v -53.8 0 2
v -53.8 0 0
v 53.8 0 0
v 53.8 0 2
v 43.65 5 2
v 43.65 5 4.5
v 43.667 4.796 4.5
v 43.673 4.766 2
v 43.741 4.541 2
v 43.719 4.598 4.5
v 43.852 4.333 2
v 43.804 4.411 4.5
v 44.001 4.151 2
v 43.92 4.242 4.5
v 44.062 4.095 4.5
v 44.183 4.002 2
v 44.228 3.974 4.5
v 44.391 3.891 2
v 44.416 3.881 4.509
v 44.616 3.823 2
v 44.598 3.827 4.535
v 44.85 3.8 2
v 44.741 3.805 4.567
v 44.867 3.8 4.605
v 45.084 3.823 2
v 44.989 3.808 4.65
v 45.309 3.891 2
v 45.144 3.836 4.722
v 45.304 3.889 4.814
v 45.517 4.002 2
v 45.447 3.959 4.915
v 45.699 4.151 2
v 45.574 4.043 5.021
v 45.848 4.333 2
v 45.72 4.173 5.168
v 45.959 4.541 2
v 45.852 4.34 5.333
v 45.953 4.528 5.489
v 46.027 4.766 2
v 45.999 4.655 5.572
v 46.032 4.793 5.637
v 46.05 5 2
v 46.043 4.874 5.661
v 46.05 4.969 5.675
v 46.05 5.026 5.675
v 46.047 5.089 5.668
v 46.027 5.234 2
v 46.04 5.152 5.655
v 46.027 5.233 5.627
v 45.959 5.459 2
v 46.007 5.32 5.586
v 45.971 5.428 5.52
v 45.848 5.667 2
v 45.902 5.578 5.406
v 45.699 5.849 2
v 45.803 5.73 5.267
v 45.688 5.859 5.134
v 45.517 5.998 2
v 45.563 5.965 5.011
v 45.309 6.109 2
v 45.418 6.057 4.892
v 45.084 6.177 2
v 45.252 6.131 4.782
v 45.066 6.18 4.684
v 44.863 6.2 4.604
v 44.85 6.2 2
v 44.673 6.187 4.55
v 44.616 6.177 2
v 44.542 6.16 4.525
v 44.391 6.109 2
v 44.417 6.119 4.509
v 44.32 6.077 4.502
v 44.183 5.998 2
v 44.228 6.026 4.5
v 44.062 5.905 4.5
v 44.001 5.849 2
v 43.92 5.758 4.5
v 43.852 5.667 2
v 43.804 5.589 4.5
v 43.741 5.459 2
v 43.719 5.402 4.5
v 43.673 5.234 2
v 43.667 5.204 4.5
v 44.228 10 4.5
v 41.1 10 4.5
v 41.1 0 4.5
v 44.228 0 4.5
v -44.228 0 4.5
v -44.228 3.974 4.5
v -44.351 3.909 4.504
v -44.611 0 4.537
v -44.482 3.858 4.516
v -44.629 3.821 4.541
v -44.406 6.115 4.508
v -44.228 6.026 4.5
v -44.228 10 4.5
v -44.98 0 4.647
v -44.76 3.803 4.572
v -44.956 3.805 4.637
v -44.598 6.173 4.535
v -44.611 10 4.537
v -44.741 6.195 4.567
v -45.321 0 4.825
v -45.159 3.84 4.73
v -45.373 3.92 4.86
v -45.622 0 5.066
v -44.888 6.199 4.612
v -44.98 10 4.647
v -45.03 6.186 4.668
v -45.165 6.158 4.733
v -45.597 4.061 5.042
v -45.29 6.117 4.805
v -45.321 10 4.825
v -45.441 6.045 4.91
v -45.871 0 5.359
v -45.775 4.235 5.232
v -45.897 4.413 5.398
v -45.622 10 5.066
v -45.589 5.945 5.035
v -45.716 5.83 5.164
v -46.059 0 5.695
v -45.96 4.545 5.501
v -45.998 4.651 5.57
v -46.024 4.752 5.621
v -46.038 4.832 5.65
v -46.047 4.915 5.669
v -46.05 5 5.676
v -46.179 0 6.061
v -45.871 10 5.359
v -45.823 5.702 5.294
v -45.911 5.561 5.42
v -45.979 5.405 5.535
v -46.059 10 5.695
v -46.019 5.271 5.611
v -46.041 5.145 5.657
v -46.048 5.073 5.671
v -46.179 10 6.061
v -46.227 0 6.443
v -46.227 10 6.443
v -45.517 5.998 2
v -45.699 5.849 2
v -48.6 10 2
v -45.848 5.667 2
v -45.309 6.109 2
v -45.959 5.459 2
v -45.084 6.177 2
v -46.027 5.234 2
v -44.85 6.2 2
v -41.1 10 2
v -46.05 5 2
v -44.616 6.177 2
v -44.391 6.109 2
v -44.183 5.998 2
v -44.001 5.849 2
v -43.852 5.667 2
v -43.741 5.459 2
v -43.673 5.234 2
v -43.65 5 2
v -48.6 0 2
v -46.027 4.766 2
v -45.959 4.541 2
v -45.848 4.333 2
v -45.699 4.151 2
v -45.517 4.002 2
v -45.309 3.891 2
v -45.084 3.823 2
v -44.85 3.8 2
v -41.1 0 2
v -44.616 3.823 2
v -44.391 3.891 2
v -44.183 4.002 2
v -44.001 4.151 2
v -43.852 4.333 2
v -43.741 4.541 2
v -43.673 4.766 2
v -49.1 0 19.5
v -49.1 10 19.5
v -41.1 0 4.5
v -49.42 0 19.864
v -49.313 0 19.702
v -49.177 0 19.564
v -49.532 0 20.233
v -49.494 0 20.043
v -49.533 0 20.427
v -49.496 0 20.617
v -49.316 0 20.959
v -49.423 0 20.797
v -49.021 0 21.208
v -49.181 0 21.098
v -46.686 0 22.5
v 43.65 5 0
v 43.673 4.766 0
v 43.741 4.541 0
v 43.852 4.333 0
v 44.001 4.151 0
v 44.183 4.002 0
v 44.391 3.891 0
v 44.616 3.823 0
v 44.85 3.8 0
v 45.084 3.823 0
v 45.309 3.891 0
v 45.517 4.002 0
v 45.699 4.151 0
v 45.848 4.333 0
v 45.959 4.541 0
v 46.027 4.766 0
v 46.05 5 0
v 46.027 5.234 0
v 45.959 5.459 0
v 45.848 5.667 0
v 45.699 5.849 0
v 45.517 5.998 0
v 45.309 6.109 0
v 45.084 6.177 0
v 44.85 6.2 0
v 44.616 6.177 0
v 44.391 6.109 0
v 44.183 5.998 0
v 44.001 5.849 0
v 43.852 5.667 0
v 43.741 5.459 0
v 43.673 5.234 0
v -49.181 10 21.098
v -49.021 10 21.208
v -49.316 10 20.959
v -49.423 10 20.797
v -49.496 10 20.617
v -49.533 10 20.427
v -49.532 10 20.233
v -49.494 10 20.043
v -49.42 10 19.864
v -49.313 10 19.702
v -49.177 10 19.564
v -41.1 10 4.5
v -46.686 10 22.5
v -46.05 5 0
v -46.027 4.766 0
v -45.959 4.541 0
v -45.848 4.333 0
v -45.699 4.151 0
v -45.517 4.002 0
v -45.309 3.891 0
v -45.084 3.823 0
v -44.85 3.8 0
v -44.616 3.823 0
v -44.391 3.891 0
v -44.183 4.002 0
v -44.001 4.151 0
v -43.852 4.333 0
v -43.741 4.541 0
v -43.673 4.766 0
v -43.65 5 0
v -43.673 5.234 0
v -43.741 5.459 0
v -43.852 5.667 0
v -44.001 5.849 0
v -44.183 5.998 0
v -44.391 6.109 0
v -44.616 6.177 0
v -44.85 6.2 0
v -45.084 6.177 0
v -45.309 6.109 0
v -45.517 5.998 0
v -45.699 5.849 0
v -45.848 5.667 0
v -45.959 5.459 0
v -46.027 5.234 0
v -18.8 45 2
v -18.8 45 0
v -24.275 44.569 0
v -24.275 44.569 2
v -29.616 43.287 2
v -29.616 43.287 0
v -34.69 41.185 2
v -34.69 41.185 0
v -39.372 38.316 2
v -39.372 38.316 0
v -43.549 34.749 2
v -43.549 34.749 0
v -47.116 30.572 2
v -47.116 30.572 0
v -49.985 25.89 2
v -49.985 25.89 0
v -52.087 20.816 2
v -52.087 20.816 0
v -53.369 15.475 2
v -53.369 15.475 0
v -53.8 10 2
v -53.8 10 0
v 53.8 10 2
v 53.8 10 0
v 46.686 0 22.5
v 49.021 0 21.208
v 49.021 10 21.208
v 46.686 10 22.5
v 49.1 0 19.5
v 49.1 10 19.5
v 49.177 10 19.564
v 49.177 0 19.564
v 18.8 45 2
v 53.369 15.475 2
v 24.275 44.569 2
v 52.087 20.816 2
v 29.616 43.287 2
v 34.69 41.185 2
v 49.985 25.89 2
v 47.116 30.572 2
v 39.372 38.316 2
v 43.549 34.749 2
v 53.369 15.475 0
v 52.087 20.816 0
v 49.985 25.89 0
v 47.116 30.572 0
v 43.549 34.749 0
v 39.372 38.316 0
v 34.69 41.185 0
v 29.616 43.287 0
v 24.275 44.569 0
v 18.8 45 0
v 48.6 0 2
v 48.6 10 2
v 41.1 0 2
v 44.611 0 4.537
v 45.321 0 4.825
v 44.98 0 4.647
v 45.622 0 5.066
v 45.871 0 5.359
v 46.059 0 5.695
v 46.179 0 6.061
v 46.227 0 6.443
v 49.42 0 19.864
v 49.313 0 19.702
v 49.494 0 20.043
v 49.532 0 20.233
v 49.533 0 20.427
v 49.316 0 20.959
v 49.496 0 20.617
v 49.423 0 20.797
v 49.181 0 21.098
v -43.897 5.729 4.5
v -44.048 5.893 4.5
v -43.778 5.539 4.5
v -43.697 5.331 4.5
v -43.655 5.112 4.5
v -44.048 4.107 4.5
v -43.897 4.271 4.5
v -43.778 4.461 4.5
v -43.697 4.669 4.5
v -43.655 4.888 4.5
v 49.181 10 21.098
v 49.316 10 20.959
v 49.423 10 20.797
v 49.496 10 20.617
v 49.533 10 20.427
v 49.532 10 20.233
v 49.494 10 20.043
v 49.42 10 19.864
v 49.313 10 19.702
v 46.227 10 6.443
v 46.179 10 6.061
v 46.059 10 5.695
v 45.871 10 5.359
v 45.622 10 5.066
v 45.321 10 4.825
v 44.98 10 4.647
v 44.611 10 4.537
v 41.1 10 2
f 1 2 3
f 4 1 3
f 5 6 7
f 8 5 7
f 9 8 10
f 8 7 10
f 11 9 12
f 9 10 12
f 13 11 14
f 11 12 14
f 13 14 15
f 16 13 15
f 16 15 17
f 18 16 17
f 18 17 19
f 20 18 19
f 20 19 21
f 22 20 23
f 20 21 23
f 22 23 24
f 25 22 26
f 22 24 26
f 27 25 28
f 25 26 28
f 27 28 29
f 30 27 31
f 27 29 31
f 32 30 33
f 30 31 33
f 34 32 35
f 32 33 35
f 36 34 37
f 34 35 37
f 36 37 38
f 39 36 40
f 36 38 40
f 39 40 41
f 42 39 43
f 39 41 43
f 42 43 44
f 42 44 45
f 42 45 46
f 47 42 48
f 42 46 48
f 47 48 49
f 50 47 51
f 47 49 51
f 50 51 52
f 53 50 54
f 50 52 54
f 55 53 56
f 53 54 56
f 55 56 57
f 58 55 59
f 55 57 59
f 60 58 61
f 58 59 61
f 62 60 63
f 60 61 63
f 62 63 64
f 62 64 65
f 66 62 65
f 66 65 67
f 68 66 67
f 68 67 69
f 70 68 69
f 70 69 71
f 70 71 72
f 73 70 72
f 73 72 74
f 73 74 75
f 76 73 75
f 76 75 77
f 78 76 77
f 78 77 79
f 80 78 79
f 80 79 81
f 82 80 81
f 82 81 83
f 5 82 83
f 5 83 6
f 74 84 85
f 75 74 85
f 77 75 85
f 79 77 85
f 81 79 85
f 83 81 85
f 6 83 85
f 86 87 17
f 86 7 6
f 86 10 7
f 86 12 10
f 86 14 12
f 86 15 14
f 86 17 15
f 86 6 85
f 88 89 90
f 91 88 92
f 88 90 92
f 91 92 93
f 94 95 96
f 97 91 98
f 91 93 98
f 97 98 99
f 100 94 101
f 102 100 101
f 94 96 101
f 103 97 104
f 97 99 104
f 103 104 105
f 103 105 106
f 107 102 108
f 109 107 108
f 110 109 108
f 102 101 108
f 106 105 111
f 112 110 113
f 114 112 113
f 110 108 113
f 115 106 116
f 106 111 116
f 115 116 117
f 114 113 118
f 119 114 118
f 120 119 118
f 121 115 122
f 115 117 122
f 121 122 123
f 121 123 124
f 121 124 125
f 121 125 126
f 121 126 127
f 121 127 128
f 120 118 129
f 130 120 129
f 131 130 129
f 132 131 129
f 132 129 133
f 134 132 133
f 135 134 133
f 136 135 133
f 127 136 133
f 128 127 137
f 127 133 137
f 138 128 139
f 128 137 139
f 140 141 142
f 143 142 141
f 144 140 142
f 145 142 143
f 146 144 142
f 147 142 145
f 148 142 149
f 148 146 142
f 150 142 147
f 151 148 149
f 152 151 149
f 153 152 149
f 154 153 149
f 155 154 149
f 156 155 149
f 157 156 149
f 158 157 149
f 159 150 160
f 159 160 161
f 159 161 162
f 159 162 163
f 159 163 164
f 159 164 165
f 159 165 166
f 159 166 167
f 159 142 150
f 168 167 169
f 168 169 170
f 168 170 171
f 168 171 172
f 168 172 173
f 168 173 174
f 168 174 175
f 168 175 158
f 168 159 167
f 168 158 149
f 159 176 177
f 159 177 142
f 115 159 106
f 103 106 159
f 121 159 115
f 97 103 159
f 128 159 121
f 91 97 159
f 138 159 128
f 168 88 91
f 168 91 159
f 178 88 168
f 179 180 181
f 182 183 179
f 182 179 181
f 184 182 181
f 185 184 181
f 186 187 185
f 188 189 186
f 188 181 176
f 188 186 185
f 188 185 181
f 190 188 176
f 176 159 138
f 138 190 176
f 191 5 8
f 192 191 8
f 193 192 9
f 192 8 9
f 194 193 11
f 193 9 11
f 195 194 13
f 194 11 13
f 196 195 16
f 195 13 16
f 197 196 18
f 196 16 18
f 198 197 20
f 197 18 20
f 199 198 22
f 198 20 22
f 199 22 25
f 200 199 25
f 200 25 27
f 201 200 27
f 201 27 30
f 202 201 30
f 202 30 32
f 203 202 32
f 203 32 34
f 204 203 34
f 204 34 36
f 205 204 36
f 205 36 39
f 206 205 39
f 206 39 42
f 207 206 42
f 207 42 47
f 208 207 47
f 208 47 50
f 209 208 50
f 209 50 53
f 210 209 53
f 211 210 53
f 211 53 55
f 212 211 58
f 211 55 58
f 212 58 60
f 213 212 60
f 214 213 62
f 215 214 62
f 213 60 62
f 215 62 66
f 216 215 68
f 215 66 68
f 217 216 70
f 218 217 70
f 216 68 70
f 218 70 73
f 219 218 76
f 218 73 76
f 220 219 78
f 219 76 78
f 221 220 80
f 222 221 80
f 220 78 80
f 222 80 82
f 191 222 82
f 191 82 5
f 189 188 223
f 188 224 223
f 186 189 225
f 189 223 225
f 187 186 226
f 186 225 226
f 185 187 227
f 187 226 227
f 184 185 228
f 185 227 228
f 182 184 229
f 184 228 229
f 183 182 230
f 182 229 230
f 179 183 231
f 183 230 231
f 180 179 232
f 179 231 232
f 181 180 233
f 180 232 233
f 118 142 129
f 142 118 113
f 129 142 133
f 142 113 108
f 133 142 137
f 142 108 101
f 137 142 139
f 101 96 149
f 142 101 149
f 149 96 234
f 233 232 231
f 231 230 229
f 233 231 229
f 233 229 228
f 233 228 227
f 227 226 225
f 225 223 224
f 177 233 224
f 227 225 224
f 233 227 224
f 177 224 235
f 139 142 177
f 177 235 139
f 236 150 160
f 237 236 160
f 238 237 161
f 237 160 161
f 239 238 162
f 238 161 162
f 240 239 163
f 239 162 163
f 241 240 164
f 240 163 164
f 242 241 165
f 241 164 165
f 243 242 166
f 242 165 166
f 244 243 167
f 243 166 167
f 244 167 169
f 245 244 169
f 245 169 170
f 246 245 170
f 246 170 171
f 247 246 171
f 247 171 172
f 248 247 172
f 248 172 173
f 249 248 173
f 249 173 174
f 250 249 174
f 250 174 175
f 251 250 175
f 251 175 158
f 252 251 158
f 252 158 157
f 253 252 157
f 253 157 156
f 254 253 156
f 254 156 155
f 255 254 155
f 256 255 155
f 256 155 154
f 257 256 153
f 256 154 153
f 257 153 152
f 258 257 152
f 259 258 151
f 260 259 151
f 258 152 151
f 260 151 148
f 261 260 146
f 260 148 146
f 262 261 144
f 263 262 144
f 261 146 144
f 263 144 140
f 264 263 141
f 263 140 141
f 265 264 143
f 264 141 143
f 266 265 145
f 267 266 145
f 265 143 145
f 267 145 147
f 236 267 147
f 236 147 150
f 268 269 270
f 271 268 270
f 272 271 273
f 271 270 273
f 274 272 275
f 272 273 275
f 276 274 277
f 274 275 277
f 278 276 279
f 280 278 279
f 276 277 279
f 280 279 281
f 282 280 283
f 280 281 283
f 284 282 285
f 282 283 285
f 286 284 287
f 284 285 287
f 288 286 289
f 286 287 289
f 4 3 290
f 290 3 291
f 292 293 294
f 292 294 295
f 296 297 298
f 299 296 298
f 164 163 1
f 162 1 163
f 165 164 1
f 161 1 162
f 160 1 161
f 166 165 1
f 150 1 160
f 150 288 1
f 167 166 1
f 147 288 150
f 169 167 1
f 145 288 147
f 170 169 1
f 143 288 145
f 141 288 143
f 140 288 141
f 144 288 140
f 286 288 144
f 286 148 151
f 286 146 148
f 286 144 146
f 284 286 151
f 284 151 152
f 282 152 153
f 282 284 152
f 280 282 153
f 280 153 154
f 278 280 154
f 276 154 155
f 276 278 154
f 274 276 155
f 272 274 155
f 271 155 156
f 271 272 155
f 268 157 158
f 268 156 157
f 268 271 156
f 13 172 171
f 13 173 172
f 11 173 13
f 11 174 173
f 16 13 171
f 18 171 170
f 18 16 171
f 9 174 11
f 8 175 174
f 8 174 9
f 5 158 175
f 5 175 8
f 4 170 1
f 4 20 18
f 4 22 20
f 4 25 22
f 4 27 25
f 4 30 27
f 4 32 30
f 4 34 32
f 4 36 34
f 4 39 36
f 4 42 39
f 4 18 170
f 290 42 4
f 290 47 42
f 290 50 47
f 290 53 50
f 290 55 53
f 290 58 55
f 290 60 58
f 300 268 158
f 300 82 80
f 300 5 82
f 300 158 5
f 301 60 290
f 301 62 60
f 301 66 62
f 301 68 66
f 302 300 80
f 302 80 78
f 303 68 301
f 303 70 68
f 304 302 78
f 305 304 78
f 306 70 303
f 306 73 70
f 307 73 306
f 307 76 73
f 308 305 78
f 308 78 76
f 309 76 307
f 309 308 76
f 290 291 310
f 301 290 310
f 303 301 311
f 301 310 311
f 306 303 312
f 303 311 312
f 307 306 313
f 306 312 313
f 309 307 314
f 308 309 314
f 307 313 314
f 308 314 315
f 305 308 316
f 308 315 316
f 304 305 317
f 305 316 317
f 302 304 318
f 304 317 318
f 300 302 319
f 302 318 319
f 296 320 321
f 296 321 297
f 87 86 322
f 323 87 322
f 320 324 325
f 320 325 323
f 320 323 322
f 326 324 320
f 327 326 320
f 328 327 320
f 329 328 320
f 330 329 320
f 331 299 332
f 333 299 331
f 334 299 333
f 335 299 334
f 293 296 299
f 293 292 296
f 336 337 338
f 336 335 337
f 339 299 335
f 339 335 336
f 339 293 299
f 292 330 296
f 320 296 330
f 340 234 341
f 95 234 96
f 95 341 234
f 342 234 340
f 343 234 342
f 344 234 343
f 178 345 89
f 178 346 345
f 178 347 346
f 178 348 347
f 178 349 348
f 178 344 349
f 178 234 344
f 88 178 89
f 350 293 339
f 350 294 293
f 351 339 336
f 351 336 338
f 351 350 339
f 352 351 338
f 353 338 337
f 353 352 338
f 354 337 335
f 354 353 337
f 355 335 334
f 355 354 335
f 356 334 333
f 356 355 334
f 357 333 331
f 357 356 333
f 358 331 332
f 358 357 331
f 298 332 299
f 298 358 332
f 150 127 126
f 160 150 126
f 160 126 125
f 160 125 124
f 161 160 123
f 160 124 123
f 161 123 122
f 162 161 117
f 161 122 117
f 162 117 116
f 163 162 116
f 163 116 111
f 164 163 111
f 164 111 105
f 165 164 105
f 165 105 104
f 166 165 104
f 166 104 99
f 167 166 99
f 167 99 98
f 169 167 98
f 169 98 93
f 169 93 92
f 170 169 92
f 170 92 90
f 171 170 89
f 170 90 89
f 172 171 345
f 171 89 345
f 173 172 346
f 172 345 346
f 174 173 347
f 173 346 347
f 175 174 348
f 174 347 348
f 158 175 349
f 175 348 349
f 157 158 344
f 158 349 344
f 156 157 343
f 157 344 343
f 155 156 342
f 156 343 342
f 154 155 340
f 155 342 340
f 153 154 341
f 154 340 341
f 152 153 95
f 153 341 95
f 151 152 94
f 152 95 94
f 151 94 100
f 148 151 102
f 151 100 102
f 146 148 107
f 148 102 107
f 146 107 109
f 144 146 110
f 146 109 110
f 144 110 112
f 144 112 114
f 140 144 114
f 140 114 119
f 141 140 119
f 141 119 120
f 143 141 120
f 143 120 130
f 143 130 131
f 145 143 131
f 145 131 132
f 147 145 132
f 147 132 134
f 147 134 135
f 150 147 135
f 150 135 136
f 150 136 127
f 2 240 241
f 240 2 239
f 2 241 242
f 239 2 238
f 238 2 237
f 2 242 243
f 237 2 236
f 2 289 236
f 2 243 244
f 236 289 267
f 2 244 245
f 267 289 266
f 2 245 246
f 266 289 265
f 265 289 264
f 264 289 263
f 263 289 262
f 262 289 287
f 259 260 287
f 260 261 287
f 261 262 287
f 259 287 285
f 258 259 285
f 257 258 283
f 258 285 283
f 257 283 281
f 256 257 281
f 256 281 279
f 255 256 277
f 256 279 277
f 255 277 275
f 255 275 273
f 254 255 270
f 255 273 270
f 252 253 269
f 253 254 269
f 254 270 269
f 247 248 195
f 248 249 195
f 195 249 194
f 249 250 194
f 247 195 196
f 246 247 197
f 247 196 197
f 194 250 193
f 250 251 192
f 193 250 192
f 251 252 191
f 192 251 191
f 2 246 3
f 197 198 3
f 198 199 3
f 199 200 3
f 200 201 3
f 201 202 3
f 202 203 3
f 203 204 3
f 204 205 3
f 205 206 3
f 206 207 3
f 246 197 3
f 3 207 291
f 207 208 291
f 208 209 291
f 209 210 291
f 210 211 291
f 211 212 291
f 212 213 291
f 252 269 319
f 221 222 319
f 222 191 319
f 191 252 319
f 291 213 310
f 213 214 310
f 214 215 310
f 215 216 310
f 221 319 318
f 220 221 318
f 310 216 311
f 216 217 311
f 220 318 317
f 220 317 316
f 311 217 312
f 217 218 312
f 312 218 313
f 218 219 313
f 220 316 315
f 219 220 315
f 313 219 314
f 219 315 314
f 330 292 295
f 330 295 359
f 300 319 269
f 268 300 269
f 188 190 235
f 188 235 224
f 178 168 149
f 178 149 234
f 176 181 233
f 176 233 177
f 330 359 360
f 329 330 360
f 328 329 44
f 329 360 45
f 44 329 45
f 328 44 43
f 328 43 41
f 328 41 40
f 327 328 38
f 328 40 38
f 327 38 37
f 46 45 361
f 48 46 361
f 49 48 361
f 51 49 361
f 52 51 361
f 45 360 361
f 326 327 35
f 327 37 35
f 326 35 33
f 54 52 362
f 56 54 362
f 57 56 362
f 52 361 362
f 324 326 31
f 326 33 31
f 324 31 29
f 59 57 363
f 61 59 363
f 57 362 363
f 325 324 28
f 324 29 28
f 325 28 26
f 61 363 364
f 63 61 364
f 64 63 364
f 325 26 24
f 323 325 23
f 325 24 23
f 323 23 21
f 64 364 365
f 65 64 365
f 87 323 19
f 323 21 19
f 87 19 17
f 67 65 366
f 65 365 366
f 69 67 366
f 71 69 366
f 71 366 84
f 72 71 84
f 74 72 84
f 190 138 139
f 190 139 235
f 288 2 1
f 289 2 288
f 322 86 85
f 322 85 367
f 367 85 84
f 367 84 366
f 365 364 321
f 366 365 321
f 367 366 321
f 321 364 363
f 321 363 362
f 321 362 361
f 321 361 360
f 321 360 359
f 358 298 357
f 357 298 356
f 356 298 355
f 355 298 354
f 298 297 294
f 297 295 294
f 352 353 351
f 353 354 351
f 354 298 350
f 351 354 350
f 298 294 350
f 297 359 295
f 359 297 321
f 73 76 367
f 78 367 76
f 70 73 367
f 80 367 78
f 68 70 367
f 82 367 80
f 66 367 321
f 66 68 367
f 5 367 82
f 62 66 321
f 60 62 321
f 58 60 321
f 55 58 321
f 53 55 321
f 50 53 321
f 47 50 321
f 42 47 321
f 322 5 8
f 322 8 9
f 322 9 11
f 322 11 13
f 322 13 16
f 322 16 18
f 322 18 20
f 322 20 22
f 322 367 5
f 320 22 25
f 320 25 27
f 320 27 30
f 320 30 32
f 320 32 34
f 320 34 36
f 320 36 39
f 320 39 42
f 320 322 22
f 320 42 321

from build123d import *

# Parameters (mm, degrees)
F0_W       = 5
F0_H       = 10
F1_DEPTH   = 2
F3_DEPTH   = 10
F4_R       = 2
F4_2_R     = 2
F5_R       = 1
F5_2_R     = 1
F7_D       = 2.4
F7_DEPTH   = 6
F7_TIP     = 0.7210327428
F7_2_D     = 2.4
F7_2_DEPTH = 6
F7_2_TIP   = 0.7210327428
F7_3_D     = 2.4
F7_3_DEPTH = 6
F7_3_TIP   = 0.7210327428


with BuildPart() as f1:
    # F0 (on Top) → F1 (new body)
    with BuildSketch(Plane.XY):
        with BuildLine():
            Line((18.8, 40), (-18.8, 40))
            ThreePointArc((-18.8, 40), (-40.0132034356, 31.2132034356), (-48.8, 10))
            Line((-48.8, 10), (-48.8, 0))
            Line((-48.8, 0), (48.8, 0))
            Line((48.8, 0), (48.8, 10))
            ThreePointArc((48.8, 10), (40.0132034356, 31.2132034356), (18.8, 40))
        make_face()
        with BuildLine():
            ThreePointArc((-48.8, 10), (-40.0132034356, 31.2132034356), (-18.8, 40))
            Line((-18.8, 40), (18.8, 40))
            ThreePointArc((18.8, 40), (40.0132034356, 31.2132034356), (48.8, 10))
            Line((48.8, 10), (53.8, 10))
            ThreePointArc((53.8, 10), (43.5487373415, 34.7487373415), (18.8, 45))
            Line((18.8, 45), (-18.8, 45))
            ThreePointArc((-18.8, 45), (-43.5487373415, 34.7487373415), (-53.8, 10))
            Line((-53.8, 10), (-48.8, 10))
        make_face()
        with Locations((51.3, 5)):
            Rectangle(F0_W, F0_H)
        with Locations((-51.3, 5)):
            Rectangle(F0_W, F0_H)
    extrude(amount=F1_DEPTH)

    # F7
    with Locations(Plane(origin=(0, 0, 0), x_dir=(1, 0, 0), z_dir=(0, 0, -1))):
        with Locations((44.85, -5), (-44.85, -5)):
            Hole(F7_D / 2, depth=F7_DEPTH)
            with Locations((0, 0, -(F7_DEPTH + F7_TIP / 2))):  # 118° drill point
                Cone(0, F7_D / 2, F7_TIP, mode=Mode.SUBTRACT)


with BuildPart() as f3:
    # F2 (on face) → F3 (new body)
    with BuildSketch(Plane.XZ):
        Polygon((-48.6, 2), (-46.1, 2), (-46.1714285714, 4.5), (-46.6857142857, 22.5), (-50.3, 20.5), (-49.1, 19.5), align=None)
        Polygon((-46.1, 2), (-41.1, 2), (-41.1, 4.5), (-46.1714285714, 4.5), align=None)
    extrude(amount=-F3_DEPTH)

    # F4#2
    f4_2_edges = [f3.edges().sort_by_distance(p)[0] for p in [
        (-46.171429, 5, 4.5),
    ]]
    fillet(f4_2_edges, radius=F4_2_R)

    # F5#2
    f5_2_edges = [f3.edges().sort_by_distance(p)[0] for p in [
        (-50.3, 5, 20.5),
    ]]
    fillet(f5_2_edges, radius=F5_2_R)

    # F7#2
    with Locations(Plane(origin=(0, 0, 0), x_dir=(1, 0, 0), z_dir=(0, 0, -1))):
        with Locations((44.85, -5), (-44.85, -5)):
            Hole(F7_2_D / 2, depth=F7_2_DEPTH)
            with Locations((0, 0, -(F7_2_DEPTH + F7_2_TIP / 2))):  # 118° drill point
                Cone(0, F7_2_D / 2, F7_2_TIP, mode=Mode.SUBTRACT)


with BuildPart() as f3b:
    # F2 (on face) → F3, piece 2 (new body)
    with BuildSketch(Plane.XZ):
        Polygon((41.1, 4.5), (41.1, 2), (46.1, 2), (46.1714285714, 4.5), align=None)
        Polygon((46.1714285714, 4.5), (46.1, 2), (48.6, 2), (49.1, 19.5), (50.3, 20.5), (46.6857142857, 22.5), align=None)
    extrude(amount=-F3_DEPTH)

    # F4
    f4_edges = [f3b.edges().sort_by_distance(p)[0] for p in [
        (46.171429, 5, 4.5),
    ]]
    fillet(f4_edges, radius=F4_R)

    # F5
    f5_edges = [f3b.edges().sort_by_distance(p)[0] for p in [
        (50.3, 5, 20.5),
    ]]
    fillet(f5_edges, radius=F5_R)

    # F7#3
    with Locations(Plane(origin=(0, 0, 0), x_dir=(1, 0, 0), z_dir=(0, 0, -1))):
        with Locations((44.85, -5), (-44.85, -5)):
            Hole(F7_3_D / 2, depth=F7_3_DEPTH)
            with Locations((0, 0, -(F7_3_DEPTH + F7_3_TIP / 2))):  # 118° drill point
                Cone(0, F7_3_D / 2, F7_3_TIP, mode=Mode.SUBTRACT)


solid = Compound([f1.part, f3.part, f3b.part])
